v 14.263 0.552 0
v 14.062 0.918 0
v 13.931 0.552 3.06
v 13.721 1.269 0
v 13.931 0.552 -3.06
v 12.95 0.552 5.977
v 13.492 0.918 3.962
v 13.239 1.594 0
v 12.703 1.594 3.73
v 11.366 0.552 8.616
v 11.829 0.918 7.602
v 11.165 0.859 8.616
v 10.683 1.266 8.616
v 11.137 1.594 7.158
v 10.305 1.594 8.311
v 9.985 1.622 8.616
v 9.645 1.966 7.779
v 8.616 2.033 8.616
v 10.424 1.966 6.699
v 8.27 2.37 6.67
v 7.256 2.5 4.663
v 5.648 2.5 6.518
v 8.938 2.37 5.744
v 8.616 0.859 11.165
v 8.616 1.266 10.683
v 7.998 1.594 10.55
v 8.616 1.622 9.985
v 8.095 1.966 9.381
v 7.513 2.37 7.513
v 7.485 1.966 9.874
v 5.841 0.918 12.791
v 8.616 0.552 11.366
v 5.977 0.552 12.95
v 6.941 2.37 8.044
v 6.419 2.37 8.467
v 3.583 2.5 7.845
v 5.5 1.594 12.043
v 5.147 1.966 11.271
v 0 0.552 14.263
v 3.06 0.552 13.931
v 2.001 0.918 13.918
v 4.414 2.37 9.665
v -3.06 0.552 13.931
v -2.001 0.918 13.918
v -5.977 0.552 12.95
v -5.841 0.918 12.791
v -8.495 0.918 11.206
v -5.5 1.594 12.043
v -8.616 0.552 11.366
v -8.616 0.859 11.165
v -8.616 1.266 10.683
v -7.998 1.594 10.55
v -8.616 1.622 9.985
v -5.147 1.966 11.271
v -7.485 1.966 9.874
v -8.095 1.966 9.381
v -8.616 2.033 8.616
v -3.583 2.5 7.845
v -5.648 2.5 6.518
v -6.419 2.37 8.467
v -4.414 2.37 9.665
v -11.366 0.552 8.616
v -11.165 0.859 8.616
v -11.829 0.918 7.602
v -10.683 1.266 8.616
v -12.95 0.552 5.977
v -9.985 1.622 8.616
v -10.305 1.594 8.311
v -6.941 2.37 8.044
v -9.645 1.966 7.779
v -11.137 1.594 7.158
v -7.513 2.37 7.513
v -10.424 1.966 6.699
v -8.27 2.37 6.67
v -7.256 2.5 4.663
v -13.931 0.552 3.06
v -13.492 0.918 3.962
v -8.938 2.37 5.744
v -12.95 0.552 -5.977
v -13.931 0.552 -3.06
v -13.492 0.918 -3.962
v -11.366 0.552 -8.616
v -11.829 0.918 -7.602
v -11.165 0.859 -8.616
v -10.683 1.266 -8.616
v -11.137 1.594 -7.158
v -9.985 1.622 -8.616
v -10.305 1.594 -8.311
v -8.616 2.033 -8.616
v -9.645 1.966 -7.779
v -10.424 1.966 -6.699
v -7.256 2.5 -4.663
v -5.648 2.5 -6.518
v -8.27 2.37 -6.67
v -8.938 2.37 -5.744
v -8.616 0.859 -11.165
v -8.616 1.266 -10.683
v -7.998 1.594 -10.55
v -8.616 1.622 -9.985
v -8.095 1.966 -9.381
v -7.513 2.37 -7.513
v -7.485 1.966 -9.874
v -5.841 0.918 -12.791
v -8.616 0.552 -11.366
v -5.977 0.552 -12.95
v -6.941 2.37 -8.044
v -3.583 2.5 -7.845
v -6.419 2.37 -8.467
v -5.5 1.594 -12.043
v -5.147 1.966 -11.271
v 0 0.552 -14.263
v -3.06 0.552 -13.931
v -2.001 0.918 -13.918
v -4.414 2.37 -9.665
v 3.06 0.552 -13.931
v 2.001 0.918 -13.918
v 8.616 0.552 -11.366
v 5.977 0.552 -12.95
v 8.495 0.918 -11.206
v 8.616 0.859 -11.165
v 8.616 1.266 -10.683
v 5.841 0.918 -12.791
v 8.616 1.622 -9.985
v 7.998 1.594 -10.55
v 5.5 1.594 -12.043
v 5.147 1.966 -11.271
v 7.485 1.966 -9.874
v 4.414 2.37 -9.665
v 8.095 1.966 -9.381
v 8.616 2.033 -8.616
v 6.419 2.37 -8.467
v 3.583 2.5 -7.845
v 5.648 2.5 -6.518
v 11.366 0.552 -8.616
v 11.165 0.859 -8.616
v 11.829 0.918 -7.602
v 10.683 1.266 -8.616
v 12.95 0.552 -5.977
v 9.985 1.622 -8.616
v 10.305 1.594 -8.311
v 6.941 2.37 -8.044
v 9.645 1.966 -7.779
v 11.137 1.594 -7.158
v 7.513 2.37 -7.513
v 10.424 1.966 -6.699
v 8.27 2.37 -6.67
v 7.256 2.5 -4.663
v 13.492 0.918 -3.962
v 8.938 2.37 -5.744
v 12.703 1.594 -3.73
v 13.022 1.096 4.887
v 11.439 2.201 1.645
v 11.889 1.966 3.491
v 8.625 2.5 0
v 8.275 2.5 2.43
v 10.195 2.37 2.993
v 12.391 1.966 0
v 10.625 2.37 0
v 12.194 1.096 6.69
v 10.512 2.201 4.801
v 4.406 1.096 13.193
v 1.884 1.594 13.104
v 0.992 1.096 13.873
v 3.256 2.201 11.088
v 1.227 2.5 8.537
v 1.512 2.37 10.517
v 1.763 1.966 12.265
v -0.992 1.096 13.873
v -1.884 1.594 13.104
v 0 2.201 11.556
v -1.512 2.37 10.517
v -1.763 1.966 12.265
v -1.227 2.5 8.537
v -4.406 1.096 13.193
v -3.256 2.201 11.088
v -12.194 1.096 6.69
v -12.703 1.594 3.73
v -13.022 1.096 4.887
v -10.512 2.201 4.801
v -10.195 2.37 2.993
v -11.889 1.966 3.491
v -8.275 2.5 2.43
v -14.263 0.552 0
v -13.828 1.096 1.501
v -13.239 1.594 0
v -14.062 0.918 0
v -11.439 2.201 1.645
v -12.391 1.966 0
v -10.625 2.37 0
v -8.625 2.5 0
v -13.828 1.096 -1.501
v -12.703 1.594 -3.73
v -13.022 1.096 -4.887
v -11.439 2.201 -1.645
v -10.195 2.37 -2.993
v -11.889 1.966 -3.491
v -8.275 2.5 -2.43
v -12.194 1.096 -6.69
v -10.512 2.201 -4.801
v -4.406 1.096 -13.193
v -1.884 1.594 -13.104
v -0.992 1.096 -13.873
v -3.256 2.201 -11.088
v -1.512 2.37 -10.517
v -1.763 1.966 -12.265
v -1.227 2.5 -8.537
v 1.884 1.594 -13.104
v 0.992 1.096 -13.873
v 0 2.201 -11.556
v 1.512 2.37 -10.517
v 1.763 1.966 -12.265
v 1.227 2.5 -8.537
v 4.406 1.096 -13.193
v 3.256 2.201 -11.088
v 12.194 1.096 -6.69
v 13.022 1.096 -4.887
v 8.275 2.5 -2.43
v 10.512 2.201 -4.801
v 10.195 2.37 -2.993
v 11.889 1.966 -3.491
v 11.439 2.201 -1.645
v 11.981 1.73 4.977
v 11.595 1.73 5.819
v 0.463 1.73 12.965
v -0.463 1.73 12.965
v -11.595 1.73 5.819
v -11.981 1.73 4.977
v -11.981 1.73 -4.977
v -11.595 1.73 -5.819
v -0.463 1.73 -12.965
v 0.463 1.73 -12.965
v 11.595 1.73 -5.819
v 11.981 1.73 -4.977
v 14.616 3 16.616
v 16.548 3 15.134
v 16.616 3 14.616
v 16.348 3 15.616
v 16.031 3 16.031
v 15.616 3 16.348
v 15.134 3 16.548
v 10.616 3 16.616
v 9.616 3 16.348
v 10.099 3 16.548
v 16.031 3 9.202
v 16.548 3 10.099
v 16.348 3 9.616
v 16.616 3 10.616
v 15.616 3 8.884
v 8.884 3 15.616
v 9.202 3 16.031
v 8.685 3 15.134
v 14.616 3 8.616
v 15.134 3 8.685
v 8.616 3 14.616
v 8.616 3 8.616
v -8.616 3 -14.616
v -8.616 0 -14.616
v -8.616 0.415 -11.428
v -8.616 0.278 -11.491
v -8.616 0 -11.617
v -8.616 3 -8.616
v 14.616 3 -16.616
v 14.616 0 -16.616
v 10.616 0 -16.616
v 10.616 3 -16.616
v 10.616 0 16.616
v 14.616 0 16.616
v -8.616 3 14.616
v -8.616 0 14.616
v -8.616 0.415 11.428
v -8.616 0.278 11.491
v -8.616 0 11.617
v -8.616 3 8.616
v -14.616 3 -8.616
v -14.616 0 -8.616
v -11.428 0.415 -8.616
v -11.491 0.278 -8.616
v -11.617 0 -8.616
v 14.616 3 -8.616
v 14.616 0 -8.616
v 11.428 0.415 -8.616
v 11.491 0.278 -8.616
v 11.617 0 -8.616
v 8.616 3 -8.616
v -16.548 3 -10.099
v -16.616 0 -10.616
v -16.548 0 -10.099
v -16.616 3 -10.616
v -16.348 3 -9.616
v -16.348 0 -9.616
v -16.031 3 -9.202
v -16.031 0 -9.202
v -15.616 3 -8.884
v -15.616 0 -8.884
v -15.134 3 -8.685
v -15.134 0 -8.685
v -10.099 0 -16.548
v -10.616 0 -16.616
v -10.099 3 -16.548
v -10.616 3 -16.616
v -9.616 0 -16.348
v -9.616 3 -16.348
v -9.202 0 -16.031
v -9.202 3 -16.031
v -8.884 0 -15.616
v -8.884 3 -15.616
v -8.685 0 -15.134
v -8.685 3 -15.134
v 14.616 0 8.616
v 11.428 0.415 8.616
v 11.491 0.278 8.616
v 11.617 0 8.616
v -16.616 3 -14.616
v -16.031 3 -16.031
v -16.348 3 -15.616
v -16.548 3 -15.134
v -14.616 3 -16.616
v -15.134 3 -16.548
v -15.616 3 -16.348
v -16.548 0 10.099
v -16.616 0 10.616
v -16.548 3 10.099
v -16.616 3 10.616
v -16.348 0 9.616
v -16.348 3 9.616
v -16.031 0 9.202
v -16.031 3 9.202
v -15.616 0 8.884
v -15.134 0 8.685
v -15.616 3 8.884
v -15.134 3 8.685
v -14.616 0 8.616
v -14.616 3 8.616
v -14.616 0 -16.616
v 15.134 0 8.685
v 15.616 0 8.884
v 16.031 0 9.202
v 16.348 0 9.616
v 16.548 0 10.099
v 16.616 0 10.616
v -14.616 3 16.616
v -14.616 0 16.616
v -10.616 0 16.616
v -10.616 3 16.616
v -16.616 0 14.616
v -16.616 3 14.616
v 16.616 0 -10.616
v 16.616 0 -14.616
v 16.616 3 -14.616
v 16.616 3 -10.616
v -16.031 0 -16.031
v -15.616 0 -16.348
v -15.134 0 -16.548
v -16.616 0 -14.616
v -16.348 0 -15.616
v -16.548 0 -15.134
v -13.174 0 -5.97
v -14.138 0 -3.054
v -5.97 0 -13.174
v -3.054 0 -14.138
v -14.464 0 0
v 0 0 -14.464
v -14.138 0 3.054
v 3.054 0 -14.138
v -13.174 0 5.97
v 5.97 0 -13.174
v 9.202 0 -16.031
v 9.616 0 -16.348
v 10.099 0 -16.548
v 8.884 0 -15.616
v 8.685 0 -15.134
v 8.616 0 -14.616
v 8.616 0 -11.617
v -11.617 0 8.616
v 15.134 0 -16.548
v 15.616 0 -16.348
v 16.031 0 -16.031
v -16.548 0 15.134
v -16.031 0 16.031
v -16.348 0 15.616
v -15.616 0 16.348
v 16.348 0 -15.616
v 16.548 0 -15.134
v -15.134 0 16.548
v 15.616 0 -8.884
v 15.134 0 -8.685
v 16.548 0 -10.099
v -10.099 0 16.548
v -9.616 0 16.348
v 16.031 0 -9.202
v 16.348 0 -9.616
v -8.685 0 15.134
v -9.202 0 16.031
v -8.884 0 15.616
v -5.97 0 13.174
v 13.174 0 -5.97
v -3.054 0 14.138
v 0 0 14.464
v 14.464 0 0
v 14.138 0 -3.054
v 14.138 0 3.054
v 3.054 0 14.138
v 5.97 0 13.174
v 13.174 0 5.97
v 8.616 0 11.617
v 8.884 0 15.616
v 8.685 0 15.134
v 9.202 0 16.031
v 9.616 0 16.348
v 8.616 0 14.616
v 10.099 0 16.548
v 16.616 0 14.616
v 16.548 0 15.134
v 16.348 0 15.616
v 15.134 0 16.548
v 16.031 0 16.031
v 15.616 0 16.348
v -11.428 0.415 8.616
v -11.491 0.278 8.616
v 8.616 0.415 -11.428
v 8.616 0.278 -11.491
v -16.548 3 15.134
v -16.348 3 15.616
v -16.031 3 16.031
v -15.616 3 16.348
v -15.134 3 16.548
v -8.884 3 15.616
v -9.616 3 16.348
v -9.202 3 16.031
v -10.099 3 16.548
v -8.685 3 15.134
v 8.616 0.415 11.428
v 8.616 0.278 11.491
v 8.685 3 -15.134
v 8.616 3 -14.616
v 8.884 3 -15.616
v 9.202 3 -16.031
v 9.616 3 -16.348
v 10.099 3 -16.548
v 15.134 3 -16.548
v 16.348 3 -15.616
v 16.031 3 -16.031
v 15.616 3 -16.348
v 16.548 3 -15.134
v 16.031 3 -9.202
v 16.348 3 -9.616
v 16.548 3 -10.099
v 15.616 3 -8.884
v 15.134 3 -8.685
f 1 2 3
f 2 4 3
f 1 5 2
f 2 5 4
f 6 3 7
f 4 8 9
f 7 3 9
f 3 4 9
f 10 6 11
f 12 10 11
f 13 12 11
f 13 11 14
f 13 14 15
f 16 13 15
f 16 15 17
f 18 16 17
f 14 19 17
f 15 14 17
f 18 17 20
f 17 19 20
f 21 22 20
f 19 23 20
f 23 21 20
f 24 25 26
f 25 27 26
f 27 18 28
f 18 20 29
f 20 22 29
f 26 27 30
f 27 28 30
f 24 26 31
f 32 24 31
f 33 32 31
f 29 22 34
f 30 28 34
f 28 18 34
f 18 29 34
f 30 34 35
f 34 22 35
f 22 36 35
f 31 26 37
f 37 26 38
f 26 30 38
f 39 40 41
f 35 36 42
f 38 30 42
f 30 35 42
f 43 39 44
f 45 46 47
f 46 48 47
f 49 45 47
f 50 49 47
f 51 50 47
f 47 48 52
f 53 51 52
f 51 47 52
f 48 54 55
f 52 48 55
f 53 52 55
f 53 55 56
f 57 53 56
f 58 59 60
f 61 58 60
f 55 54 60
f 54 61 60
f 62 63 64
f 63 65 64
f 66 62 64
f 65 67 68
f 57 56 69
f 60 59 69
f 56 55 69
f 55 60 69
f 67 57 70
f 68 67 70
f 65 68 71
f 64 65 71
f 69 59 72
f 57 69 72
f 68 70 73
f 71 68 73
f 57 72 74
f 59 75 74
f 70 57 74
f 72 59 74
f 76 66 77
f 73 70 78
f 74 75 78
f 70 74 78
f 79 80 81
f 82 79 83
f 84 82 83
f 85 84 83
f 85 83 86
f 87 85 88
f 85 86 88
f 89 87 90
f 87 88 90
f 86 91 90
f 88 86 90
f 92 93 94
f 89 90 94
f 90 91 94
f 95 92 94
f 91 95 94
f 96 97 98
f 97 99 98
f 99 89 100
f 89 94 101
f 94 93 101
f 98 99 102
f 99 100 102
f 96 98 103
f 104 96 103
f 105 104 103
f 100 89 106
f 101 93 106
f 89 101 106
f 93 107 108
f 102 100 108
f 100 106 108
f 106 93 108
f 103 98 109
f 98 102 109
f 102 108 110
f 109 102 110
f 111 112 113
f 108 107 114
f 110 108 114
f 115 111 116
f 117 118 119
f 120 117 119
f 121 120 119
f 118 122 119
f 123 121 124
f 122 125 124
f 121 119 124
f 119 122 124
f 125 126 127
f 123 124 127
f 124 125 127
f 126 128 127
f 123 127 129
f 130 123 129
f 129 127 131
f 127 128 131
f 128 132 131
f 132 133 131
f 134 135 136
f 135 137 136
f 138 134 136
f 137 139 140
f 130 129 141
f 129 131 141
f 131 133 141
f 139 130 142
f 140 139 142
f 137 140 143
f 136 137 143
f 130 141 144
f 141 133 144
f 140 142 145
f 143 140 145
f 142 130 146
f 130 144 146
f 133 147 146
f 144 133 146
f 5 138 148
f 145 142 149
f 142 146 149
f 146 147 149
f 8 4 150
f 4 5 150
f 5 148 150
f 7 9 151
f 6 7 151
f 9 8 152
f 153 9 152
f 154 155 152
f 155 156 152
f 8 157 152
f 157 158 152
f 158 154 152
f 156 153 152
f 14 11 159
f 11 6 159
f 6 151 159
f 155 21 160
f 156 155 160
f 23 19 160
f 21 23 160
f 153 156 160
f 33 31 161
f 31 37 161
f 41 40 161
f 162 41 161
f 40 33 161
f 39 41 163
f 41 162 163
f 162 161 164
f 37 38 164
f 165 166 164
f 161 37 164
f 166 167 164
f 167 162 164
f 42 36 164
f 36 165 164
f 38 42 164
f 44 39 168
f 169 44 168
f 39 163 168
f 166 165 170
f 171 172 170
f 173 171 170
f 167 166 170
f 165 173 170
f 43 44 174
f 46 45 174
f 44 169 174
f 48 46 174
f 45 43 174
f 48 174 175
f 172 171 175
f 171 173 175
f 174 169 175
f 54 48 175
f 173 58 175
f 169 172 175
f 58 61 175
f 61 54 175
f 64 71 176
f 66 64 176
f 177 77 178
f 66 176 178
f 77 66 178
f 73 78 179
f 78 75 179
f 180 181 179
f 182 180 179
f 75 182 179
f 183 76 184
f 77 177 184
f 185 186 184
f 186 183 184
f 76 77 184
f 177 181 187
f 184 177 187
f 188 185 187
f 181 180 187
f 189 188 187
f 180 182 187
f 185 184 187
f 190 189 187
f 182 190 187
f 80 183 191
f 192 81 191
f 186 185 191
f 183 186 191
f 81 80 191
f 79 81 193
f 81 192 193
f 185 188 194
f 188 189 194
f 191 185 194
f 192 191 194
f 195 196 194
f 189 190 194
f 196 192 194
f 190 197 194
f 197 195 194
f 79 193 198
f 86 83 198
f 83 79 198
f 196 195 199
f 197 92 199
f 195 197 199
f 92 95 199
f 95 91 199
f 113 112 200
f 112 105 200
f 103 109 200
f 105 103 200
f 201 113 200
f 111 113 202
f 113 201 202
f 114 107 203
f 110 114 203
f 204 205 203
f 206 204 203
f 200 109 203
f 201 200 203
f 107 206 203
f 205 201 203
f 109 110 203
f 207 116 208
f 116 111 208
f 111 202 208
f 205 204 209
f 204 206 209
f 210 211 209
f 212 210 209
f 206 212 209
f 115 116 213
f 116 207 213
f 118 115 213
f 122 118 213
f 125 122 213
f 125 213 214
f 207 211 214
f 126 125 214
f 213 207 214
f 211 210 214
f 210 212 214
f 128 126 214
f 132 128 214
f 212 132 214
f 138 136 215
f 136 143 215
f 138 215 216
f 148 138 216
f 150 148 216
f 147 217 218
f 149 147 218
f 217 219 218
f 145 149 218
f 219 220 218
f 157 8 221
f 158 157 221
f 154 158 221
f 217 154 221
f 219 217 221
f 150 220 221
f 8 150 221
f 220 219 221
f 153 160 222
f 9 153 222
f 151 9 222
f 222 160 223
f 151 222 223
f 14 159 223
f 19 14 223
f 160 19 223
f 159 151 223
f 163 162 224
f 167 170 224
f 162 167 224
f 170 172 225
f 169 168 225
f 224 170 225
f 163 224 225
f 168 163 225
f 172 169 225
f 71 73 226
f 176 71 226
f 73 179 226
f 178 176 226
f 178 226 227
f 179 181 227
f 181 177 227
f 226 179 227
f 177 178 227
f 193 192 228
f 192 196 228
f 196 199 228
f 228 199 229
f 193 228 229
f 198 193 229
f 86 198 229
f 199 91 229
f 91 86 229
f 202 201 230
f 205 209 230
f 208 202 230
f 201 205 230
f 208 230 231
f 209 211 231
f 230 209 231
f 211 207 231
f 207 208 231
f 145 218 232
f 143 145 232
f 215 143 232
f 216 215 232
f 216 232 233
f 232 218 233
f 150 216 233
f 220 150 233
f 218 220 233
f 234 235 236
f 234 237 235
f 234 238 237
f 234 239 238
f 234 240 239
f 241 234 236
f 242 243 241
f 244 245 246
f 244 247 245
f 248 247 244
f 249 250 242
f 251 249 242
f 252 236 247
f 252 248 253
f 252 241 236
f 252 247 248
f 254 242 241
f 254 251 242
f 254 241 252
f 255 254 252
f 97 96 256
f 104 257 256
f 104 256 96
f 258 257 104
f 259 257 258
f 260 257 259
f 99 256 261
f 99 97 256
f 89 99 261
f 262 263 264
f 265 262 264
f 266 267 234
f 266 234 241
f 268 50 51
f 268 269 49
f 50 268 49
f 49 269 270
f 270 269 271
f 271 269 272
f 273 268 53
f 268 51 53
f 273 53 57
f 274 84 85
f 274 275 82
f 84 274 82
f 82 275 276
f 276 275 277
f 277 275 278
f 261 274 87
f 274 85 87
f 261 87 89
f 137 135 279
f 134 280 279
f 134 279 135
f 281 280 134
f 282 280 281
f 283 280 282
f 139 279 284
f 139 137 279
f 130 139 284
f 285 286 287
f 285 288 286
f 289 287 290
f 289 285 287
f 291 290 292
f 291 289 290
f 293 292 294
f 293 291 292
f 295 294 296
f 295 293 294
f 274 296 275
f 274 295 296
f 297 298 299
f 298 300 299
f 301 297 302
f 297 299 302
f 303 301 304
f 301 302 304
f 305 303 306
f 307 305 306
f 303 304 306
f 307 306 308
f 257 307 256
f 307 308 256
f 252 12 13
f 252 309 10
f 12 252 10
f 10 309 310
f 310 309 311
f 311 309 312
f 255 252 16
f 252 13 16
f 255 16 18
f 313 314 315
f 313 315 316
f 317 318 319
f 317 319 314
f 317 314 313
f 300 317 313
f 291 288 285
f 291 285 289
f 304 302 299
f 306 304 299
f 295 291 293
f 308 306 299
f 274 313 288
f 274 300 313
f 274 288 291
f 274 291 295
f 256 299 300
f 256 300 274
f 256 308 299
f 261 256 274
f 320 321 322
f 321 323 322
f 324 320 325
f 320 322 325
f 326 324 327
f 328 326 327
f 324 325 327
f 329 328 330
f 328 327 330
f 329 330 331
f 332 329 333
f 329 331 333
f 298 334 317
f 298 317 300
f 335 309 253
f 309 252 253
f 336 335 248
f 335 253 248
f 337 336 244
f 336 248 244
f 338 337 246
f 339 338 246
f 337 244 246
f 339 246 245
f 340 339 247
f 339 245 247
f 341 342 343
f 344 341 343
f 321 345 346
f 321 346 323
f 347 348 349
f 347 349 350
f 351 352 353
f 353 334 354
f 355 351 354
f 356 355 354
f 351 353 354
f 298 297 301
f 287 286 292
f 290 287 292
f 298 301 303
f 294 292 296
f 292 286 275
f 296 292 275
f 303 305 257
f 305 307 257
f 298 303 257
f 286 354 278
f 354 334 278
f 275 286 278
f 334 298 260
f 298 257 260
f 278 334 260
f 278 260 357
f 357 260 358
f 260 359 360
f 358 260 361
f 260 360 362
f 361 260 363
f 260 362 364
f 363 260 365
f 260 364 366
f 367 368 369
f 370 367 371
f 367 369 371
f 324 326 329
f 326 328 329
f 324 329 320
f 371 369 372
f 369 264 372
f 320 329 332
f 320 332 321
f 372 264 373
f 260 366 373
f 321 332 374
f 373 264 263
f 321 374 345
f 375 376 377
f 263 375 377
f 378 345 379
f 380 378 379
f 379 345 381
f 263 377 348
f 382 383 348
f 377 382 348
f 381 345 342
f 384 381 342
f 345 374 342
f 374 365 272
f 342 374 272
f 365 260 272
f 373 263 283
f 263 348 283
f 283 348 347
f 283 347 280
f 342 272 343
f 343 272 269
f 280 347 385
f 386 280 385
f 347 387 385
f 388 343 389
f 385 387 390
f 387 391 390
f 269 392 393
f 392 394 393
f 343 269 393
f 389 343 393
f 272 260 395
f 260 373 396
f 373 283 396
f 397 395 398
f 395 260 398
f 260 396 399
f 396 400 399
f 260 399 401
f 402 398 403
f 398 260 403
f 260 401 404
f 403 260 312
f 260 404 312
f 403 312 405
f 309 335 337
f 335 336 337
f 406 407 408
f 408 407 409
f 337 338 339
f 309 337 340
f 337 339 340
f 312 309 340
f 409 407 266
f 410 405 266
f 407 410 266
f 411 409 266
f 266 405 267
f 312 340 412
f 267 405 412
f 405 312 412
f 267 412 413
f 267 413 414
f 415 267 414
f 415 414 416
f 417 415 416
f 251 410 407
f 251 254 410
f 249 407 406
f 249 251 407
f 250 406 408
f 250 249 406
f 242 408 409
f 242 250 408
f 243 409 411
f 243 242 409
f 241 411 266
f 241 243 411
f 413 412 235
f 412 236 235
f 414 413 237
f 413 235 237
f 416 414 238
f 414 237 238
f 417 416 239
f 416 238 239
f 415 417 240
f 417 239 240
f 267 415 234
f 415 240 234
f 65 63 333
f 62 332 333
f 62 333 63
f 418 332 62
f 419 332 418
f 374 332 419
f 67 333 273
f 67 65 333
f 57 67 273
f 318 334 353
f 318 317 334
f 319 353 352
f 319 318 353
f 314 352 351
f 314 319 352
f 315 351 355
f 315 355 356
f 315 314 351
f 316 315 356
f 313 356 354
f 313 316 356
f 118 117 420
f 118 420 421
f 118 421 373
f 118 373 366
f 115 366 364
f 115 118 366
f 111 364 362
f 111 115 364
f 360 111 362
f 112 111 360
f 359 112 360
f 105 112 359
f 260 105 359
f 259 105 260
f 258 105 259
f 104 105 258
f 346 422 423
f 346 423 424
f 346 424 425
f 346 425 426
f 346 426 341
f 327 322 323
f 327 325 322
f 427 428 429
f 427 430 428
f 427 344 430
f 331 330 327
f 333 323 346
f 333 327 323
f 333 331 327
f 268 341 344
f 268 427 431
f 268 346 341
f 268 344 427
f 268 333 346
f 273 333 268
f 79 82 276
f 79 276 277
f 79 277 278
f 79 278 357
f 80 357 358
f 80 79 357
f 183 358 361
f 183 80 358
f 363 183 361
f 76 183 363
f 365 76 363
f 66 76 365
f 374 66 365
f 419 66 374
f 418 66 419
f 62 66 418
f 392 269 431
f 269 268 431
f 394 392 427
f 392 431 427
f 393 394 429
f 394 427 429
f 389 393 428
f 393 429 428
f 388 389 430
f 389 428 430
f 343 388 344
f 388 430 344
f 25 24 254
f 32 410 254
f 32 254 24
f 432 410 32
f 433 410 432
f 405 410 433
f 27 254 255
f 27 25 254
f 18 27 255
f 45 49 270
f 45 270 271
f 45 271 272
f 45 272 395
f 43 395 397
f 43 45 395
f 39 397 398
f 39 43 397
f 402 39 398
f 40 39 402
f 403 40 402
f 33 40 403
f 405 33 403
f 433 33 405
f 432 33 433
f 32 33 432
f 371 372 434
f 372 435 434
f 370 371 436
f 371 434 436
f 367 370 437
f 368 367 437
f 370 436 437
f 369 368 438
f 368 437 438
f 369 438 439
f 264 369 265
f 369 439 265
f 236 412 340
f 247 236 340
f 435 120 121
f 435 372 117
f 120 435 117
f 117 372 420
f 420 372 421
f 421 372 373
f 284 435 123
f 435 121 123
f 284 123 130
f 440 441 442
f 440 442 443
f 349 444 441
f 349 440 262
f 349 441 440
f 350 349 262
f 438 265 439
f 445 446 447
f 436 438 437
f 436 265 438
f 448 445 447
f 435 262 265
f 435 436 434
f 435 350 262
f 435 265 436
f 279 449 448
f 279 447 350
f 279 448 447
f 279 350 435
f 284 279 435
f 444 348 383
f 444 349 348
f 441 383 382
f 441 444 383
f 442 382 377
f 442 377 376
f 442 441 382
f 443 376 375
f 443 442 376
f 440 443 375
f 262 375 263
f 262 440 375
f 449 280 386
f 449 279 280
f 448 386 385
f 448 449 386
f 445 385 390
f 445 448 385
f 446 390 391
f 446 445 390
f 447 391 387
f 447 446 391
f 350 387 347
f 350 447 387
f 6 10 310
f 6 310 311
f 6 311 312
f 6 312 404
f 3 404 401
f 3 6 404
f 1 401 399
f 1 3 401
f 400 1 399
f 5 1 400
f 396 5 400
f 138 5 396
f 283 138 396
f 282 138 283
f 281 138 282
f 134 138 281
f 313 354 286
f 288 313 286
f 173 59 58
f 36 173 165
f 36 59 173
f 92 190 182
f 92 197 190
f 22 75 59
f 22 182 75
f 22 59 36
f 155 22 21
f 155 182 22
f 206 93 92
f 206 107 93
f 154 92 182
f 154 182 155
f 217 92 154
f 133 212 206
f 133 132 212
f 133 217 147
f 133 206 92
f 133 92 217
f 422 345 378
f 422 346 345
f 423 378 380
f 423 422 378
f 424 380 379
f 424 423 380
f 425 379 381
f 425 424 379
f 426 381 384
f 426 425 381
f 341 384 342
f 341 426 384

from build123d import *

# Parameters (mm, degrees)
SKETCH2_R                = 14.463803576
BOSS_EXTRUDE1_DEPTH      = 2.5
BOSS_EXTRUDE1_TAPER      = 20
SKETCH4_W                = 8
SKETCH4_H                = 8
BOSS_EXTRUDE2_DEPTH      = 3
FILLET2_R                = 2
CIRPATTERN1_COUNT        = 4
FILLET2_OF_CIRPATTERN1_R = 2


with BuildPart() as part:
    # Sketch2 → Boss-Extrude1 (new body)
    with BuildSketch(Plane(origin=(0, 0, 0), x_dir=(1, 0, 0), z_dir=(0, 1, 0))):
        Circle(SKETCH2_R)
    extrude(amount=BOSS_EXTRUDE1_DEPTH, taper=BOSS_EXTRUDE1_TAPER)

    # Fillet1
    # an asymmetric fillet: 6, 4 mm, written as the material it takes off along each edge
    with BuildSketch(Plane(origin=(0, 2.5, 0), x_dir=(1, 0, 0), z_dir=(0, 0, -1))) as fillet1_piece_1:
        with BuildLine():
            Bezier((14.262848017, 1.94787914), (13.55387799, 0), (8.624692292, 0), weights=[1, 0.819152044, 1])
            Line((8.624692292, 0), (13.55387799, 0))
            Line((13.55387799, 0), (14.262848017, 1.94787914))
        make_face()
    revolve(axis=Axis((0, 2.5, 0), (0, -1, 0)), mode=Mode.SUBTRACT)

    # Sketch4 → Boss-Extrude2 (add)
    with BuildSketch(Plane(origin=(0, 0, 0), x_dir=(1, 0, 0), z_dir=(0, 1, 0))):
        with Locations((-12.616427752, -12.616427752)):
            Rectangle(SKETCH4_W, SKETCH4_H)
    boss_extrude2 = extrude(amount=BOSS_EXTRUDE2_DEPTH)

    # Fillet2
    fillet2_edges = [part.edges().sort_by_distance(p)[0] for p in [
        (-8.616427752, 1.5, 16.616427752),
        (-16.616427752, 1.5, 8.616427752),
        (-16.616427752, 1.5, 16.616427752),
    ]]
    fillet(fillet2_edges, radius=FILLET2_R)

    # CirPattern1: Boss-Extrude2 ×4 about axis
    cirpattern1_axis = Axis((0, 0, 0), (0, 1, 0))
    for i in range(1, CIRPATTERN1_COUNT):
        add(boss_extrude2.rotate(cirpattern1_axis, i * 360 / CIRPATTERN1_COUNT))

    # Fillet2 of CirPattern1
    fillet2_of_cirpattern1_edges = [part.edges().sort_by_distance(p)[0] for p in [
        (16.616427752, 1.5, 8.616427752),
        (8.616427752, 1.5, 16.616427752),
        (16.616427752, 1.5, 16.616427752),
        (8.616427752, 1.5, -16.616427752),
        (16.616427752, 1.5, -8.616427752),
        (16.616427752, 1.5, -16.616427752),
        (-16.616427752, 1.5, -8.616427752),
        (-8.616427752, 1.5, -16.616427752),
        (-16.616427752, 1.5, -16.616427752),
    ]]
    fillet(fillet2_of_cirpattern1_edges, radius=FILLET2_OF_CIRPATTERN1_R)


solid = part.part
